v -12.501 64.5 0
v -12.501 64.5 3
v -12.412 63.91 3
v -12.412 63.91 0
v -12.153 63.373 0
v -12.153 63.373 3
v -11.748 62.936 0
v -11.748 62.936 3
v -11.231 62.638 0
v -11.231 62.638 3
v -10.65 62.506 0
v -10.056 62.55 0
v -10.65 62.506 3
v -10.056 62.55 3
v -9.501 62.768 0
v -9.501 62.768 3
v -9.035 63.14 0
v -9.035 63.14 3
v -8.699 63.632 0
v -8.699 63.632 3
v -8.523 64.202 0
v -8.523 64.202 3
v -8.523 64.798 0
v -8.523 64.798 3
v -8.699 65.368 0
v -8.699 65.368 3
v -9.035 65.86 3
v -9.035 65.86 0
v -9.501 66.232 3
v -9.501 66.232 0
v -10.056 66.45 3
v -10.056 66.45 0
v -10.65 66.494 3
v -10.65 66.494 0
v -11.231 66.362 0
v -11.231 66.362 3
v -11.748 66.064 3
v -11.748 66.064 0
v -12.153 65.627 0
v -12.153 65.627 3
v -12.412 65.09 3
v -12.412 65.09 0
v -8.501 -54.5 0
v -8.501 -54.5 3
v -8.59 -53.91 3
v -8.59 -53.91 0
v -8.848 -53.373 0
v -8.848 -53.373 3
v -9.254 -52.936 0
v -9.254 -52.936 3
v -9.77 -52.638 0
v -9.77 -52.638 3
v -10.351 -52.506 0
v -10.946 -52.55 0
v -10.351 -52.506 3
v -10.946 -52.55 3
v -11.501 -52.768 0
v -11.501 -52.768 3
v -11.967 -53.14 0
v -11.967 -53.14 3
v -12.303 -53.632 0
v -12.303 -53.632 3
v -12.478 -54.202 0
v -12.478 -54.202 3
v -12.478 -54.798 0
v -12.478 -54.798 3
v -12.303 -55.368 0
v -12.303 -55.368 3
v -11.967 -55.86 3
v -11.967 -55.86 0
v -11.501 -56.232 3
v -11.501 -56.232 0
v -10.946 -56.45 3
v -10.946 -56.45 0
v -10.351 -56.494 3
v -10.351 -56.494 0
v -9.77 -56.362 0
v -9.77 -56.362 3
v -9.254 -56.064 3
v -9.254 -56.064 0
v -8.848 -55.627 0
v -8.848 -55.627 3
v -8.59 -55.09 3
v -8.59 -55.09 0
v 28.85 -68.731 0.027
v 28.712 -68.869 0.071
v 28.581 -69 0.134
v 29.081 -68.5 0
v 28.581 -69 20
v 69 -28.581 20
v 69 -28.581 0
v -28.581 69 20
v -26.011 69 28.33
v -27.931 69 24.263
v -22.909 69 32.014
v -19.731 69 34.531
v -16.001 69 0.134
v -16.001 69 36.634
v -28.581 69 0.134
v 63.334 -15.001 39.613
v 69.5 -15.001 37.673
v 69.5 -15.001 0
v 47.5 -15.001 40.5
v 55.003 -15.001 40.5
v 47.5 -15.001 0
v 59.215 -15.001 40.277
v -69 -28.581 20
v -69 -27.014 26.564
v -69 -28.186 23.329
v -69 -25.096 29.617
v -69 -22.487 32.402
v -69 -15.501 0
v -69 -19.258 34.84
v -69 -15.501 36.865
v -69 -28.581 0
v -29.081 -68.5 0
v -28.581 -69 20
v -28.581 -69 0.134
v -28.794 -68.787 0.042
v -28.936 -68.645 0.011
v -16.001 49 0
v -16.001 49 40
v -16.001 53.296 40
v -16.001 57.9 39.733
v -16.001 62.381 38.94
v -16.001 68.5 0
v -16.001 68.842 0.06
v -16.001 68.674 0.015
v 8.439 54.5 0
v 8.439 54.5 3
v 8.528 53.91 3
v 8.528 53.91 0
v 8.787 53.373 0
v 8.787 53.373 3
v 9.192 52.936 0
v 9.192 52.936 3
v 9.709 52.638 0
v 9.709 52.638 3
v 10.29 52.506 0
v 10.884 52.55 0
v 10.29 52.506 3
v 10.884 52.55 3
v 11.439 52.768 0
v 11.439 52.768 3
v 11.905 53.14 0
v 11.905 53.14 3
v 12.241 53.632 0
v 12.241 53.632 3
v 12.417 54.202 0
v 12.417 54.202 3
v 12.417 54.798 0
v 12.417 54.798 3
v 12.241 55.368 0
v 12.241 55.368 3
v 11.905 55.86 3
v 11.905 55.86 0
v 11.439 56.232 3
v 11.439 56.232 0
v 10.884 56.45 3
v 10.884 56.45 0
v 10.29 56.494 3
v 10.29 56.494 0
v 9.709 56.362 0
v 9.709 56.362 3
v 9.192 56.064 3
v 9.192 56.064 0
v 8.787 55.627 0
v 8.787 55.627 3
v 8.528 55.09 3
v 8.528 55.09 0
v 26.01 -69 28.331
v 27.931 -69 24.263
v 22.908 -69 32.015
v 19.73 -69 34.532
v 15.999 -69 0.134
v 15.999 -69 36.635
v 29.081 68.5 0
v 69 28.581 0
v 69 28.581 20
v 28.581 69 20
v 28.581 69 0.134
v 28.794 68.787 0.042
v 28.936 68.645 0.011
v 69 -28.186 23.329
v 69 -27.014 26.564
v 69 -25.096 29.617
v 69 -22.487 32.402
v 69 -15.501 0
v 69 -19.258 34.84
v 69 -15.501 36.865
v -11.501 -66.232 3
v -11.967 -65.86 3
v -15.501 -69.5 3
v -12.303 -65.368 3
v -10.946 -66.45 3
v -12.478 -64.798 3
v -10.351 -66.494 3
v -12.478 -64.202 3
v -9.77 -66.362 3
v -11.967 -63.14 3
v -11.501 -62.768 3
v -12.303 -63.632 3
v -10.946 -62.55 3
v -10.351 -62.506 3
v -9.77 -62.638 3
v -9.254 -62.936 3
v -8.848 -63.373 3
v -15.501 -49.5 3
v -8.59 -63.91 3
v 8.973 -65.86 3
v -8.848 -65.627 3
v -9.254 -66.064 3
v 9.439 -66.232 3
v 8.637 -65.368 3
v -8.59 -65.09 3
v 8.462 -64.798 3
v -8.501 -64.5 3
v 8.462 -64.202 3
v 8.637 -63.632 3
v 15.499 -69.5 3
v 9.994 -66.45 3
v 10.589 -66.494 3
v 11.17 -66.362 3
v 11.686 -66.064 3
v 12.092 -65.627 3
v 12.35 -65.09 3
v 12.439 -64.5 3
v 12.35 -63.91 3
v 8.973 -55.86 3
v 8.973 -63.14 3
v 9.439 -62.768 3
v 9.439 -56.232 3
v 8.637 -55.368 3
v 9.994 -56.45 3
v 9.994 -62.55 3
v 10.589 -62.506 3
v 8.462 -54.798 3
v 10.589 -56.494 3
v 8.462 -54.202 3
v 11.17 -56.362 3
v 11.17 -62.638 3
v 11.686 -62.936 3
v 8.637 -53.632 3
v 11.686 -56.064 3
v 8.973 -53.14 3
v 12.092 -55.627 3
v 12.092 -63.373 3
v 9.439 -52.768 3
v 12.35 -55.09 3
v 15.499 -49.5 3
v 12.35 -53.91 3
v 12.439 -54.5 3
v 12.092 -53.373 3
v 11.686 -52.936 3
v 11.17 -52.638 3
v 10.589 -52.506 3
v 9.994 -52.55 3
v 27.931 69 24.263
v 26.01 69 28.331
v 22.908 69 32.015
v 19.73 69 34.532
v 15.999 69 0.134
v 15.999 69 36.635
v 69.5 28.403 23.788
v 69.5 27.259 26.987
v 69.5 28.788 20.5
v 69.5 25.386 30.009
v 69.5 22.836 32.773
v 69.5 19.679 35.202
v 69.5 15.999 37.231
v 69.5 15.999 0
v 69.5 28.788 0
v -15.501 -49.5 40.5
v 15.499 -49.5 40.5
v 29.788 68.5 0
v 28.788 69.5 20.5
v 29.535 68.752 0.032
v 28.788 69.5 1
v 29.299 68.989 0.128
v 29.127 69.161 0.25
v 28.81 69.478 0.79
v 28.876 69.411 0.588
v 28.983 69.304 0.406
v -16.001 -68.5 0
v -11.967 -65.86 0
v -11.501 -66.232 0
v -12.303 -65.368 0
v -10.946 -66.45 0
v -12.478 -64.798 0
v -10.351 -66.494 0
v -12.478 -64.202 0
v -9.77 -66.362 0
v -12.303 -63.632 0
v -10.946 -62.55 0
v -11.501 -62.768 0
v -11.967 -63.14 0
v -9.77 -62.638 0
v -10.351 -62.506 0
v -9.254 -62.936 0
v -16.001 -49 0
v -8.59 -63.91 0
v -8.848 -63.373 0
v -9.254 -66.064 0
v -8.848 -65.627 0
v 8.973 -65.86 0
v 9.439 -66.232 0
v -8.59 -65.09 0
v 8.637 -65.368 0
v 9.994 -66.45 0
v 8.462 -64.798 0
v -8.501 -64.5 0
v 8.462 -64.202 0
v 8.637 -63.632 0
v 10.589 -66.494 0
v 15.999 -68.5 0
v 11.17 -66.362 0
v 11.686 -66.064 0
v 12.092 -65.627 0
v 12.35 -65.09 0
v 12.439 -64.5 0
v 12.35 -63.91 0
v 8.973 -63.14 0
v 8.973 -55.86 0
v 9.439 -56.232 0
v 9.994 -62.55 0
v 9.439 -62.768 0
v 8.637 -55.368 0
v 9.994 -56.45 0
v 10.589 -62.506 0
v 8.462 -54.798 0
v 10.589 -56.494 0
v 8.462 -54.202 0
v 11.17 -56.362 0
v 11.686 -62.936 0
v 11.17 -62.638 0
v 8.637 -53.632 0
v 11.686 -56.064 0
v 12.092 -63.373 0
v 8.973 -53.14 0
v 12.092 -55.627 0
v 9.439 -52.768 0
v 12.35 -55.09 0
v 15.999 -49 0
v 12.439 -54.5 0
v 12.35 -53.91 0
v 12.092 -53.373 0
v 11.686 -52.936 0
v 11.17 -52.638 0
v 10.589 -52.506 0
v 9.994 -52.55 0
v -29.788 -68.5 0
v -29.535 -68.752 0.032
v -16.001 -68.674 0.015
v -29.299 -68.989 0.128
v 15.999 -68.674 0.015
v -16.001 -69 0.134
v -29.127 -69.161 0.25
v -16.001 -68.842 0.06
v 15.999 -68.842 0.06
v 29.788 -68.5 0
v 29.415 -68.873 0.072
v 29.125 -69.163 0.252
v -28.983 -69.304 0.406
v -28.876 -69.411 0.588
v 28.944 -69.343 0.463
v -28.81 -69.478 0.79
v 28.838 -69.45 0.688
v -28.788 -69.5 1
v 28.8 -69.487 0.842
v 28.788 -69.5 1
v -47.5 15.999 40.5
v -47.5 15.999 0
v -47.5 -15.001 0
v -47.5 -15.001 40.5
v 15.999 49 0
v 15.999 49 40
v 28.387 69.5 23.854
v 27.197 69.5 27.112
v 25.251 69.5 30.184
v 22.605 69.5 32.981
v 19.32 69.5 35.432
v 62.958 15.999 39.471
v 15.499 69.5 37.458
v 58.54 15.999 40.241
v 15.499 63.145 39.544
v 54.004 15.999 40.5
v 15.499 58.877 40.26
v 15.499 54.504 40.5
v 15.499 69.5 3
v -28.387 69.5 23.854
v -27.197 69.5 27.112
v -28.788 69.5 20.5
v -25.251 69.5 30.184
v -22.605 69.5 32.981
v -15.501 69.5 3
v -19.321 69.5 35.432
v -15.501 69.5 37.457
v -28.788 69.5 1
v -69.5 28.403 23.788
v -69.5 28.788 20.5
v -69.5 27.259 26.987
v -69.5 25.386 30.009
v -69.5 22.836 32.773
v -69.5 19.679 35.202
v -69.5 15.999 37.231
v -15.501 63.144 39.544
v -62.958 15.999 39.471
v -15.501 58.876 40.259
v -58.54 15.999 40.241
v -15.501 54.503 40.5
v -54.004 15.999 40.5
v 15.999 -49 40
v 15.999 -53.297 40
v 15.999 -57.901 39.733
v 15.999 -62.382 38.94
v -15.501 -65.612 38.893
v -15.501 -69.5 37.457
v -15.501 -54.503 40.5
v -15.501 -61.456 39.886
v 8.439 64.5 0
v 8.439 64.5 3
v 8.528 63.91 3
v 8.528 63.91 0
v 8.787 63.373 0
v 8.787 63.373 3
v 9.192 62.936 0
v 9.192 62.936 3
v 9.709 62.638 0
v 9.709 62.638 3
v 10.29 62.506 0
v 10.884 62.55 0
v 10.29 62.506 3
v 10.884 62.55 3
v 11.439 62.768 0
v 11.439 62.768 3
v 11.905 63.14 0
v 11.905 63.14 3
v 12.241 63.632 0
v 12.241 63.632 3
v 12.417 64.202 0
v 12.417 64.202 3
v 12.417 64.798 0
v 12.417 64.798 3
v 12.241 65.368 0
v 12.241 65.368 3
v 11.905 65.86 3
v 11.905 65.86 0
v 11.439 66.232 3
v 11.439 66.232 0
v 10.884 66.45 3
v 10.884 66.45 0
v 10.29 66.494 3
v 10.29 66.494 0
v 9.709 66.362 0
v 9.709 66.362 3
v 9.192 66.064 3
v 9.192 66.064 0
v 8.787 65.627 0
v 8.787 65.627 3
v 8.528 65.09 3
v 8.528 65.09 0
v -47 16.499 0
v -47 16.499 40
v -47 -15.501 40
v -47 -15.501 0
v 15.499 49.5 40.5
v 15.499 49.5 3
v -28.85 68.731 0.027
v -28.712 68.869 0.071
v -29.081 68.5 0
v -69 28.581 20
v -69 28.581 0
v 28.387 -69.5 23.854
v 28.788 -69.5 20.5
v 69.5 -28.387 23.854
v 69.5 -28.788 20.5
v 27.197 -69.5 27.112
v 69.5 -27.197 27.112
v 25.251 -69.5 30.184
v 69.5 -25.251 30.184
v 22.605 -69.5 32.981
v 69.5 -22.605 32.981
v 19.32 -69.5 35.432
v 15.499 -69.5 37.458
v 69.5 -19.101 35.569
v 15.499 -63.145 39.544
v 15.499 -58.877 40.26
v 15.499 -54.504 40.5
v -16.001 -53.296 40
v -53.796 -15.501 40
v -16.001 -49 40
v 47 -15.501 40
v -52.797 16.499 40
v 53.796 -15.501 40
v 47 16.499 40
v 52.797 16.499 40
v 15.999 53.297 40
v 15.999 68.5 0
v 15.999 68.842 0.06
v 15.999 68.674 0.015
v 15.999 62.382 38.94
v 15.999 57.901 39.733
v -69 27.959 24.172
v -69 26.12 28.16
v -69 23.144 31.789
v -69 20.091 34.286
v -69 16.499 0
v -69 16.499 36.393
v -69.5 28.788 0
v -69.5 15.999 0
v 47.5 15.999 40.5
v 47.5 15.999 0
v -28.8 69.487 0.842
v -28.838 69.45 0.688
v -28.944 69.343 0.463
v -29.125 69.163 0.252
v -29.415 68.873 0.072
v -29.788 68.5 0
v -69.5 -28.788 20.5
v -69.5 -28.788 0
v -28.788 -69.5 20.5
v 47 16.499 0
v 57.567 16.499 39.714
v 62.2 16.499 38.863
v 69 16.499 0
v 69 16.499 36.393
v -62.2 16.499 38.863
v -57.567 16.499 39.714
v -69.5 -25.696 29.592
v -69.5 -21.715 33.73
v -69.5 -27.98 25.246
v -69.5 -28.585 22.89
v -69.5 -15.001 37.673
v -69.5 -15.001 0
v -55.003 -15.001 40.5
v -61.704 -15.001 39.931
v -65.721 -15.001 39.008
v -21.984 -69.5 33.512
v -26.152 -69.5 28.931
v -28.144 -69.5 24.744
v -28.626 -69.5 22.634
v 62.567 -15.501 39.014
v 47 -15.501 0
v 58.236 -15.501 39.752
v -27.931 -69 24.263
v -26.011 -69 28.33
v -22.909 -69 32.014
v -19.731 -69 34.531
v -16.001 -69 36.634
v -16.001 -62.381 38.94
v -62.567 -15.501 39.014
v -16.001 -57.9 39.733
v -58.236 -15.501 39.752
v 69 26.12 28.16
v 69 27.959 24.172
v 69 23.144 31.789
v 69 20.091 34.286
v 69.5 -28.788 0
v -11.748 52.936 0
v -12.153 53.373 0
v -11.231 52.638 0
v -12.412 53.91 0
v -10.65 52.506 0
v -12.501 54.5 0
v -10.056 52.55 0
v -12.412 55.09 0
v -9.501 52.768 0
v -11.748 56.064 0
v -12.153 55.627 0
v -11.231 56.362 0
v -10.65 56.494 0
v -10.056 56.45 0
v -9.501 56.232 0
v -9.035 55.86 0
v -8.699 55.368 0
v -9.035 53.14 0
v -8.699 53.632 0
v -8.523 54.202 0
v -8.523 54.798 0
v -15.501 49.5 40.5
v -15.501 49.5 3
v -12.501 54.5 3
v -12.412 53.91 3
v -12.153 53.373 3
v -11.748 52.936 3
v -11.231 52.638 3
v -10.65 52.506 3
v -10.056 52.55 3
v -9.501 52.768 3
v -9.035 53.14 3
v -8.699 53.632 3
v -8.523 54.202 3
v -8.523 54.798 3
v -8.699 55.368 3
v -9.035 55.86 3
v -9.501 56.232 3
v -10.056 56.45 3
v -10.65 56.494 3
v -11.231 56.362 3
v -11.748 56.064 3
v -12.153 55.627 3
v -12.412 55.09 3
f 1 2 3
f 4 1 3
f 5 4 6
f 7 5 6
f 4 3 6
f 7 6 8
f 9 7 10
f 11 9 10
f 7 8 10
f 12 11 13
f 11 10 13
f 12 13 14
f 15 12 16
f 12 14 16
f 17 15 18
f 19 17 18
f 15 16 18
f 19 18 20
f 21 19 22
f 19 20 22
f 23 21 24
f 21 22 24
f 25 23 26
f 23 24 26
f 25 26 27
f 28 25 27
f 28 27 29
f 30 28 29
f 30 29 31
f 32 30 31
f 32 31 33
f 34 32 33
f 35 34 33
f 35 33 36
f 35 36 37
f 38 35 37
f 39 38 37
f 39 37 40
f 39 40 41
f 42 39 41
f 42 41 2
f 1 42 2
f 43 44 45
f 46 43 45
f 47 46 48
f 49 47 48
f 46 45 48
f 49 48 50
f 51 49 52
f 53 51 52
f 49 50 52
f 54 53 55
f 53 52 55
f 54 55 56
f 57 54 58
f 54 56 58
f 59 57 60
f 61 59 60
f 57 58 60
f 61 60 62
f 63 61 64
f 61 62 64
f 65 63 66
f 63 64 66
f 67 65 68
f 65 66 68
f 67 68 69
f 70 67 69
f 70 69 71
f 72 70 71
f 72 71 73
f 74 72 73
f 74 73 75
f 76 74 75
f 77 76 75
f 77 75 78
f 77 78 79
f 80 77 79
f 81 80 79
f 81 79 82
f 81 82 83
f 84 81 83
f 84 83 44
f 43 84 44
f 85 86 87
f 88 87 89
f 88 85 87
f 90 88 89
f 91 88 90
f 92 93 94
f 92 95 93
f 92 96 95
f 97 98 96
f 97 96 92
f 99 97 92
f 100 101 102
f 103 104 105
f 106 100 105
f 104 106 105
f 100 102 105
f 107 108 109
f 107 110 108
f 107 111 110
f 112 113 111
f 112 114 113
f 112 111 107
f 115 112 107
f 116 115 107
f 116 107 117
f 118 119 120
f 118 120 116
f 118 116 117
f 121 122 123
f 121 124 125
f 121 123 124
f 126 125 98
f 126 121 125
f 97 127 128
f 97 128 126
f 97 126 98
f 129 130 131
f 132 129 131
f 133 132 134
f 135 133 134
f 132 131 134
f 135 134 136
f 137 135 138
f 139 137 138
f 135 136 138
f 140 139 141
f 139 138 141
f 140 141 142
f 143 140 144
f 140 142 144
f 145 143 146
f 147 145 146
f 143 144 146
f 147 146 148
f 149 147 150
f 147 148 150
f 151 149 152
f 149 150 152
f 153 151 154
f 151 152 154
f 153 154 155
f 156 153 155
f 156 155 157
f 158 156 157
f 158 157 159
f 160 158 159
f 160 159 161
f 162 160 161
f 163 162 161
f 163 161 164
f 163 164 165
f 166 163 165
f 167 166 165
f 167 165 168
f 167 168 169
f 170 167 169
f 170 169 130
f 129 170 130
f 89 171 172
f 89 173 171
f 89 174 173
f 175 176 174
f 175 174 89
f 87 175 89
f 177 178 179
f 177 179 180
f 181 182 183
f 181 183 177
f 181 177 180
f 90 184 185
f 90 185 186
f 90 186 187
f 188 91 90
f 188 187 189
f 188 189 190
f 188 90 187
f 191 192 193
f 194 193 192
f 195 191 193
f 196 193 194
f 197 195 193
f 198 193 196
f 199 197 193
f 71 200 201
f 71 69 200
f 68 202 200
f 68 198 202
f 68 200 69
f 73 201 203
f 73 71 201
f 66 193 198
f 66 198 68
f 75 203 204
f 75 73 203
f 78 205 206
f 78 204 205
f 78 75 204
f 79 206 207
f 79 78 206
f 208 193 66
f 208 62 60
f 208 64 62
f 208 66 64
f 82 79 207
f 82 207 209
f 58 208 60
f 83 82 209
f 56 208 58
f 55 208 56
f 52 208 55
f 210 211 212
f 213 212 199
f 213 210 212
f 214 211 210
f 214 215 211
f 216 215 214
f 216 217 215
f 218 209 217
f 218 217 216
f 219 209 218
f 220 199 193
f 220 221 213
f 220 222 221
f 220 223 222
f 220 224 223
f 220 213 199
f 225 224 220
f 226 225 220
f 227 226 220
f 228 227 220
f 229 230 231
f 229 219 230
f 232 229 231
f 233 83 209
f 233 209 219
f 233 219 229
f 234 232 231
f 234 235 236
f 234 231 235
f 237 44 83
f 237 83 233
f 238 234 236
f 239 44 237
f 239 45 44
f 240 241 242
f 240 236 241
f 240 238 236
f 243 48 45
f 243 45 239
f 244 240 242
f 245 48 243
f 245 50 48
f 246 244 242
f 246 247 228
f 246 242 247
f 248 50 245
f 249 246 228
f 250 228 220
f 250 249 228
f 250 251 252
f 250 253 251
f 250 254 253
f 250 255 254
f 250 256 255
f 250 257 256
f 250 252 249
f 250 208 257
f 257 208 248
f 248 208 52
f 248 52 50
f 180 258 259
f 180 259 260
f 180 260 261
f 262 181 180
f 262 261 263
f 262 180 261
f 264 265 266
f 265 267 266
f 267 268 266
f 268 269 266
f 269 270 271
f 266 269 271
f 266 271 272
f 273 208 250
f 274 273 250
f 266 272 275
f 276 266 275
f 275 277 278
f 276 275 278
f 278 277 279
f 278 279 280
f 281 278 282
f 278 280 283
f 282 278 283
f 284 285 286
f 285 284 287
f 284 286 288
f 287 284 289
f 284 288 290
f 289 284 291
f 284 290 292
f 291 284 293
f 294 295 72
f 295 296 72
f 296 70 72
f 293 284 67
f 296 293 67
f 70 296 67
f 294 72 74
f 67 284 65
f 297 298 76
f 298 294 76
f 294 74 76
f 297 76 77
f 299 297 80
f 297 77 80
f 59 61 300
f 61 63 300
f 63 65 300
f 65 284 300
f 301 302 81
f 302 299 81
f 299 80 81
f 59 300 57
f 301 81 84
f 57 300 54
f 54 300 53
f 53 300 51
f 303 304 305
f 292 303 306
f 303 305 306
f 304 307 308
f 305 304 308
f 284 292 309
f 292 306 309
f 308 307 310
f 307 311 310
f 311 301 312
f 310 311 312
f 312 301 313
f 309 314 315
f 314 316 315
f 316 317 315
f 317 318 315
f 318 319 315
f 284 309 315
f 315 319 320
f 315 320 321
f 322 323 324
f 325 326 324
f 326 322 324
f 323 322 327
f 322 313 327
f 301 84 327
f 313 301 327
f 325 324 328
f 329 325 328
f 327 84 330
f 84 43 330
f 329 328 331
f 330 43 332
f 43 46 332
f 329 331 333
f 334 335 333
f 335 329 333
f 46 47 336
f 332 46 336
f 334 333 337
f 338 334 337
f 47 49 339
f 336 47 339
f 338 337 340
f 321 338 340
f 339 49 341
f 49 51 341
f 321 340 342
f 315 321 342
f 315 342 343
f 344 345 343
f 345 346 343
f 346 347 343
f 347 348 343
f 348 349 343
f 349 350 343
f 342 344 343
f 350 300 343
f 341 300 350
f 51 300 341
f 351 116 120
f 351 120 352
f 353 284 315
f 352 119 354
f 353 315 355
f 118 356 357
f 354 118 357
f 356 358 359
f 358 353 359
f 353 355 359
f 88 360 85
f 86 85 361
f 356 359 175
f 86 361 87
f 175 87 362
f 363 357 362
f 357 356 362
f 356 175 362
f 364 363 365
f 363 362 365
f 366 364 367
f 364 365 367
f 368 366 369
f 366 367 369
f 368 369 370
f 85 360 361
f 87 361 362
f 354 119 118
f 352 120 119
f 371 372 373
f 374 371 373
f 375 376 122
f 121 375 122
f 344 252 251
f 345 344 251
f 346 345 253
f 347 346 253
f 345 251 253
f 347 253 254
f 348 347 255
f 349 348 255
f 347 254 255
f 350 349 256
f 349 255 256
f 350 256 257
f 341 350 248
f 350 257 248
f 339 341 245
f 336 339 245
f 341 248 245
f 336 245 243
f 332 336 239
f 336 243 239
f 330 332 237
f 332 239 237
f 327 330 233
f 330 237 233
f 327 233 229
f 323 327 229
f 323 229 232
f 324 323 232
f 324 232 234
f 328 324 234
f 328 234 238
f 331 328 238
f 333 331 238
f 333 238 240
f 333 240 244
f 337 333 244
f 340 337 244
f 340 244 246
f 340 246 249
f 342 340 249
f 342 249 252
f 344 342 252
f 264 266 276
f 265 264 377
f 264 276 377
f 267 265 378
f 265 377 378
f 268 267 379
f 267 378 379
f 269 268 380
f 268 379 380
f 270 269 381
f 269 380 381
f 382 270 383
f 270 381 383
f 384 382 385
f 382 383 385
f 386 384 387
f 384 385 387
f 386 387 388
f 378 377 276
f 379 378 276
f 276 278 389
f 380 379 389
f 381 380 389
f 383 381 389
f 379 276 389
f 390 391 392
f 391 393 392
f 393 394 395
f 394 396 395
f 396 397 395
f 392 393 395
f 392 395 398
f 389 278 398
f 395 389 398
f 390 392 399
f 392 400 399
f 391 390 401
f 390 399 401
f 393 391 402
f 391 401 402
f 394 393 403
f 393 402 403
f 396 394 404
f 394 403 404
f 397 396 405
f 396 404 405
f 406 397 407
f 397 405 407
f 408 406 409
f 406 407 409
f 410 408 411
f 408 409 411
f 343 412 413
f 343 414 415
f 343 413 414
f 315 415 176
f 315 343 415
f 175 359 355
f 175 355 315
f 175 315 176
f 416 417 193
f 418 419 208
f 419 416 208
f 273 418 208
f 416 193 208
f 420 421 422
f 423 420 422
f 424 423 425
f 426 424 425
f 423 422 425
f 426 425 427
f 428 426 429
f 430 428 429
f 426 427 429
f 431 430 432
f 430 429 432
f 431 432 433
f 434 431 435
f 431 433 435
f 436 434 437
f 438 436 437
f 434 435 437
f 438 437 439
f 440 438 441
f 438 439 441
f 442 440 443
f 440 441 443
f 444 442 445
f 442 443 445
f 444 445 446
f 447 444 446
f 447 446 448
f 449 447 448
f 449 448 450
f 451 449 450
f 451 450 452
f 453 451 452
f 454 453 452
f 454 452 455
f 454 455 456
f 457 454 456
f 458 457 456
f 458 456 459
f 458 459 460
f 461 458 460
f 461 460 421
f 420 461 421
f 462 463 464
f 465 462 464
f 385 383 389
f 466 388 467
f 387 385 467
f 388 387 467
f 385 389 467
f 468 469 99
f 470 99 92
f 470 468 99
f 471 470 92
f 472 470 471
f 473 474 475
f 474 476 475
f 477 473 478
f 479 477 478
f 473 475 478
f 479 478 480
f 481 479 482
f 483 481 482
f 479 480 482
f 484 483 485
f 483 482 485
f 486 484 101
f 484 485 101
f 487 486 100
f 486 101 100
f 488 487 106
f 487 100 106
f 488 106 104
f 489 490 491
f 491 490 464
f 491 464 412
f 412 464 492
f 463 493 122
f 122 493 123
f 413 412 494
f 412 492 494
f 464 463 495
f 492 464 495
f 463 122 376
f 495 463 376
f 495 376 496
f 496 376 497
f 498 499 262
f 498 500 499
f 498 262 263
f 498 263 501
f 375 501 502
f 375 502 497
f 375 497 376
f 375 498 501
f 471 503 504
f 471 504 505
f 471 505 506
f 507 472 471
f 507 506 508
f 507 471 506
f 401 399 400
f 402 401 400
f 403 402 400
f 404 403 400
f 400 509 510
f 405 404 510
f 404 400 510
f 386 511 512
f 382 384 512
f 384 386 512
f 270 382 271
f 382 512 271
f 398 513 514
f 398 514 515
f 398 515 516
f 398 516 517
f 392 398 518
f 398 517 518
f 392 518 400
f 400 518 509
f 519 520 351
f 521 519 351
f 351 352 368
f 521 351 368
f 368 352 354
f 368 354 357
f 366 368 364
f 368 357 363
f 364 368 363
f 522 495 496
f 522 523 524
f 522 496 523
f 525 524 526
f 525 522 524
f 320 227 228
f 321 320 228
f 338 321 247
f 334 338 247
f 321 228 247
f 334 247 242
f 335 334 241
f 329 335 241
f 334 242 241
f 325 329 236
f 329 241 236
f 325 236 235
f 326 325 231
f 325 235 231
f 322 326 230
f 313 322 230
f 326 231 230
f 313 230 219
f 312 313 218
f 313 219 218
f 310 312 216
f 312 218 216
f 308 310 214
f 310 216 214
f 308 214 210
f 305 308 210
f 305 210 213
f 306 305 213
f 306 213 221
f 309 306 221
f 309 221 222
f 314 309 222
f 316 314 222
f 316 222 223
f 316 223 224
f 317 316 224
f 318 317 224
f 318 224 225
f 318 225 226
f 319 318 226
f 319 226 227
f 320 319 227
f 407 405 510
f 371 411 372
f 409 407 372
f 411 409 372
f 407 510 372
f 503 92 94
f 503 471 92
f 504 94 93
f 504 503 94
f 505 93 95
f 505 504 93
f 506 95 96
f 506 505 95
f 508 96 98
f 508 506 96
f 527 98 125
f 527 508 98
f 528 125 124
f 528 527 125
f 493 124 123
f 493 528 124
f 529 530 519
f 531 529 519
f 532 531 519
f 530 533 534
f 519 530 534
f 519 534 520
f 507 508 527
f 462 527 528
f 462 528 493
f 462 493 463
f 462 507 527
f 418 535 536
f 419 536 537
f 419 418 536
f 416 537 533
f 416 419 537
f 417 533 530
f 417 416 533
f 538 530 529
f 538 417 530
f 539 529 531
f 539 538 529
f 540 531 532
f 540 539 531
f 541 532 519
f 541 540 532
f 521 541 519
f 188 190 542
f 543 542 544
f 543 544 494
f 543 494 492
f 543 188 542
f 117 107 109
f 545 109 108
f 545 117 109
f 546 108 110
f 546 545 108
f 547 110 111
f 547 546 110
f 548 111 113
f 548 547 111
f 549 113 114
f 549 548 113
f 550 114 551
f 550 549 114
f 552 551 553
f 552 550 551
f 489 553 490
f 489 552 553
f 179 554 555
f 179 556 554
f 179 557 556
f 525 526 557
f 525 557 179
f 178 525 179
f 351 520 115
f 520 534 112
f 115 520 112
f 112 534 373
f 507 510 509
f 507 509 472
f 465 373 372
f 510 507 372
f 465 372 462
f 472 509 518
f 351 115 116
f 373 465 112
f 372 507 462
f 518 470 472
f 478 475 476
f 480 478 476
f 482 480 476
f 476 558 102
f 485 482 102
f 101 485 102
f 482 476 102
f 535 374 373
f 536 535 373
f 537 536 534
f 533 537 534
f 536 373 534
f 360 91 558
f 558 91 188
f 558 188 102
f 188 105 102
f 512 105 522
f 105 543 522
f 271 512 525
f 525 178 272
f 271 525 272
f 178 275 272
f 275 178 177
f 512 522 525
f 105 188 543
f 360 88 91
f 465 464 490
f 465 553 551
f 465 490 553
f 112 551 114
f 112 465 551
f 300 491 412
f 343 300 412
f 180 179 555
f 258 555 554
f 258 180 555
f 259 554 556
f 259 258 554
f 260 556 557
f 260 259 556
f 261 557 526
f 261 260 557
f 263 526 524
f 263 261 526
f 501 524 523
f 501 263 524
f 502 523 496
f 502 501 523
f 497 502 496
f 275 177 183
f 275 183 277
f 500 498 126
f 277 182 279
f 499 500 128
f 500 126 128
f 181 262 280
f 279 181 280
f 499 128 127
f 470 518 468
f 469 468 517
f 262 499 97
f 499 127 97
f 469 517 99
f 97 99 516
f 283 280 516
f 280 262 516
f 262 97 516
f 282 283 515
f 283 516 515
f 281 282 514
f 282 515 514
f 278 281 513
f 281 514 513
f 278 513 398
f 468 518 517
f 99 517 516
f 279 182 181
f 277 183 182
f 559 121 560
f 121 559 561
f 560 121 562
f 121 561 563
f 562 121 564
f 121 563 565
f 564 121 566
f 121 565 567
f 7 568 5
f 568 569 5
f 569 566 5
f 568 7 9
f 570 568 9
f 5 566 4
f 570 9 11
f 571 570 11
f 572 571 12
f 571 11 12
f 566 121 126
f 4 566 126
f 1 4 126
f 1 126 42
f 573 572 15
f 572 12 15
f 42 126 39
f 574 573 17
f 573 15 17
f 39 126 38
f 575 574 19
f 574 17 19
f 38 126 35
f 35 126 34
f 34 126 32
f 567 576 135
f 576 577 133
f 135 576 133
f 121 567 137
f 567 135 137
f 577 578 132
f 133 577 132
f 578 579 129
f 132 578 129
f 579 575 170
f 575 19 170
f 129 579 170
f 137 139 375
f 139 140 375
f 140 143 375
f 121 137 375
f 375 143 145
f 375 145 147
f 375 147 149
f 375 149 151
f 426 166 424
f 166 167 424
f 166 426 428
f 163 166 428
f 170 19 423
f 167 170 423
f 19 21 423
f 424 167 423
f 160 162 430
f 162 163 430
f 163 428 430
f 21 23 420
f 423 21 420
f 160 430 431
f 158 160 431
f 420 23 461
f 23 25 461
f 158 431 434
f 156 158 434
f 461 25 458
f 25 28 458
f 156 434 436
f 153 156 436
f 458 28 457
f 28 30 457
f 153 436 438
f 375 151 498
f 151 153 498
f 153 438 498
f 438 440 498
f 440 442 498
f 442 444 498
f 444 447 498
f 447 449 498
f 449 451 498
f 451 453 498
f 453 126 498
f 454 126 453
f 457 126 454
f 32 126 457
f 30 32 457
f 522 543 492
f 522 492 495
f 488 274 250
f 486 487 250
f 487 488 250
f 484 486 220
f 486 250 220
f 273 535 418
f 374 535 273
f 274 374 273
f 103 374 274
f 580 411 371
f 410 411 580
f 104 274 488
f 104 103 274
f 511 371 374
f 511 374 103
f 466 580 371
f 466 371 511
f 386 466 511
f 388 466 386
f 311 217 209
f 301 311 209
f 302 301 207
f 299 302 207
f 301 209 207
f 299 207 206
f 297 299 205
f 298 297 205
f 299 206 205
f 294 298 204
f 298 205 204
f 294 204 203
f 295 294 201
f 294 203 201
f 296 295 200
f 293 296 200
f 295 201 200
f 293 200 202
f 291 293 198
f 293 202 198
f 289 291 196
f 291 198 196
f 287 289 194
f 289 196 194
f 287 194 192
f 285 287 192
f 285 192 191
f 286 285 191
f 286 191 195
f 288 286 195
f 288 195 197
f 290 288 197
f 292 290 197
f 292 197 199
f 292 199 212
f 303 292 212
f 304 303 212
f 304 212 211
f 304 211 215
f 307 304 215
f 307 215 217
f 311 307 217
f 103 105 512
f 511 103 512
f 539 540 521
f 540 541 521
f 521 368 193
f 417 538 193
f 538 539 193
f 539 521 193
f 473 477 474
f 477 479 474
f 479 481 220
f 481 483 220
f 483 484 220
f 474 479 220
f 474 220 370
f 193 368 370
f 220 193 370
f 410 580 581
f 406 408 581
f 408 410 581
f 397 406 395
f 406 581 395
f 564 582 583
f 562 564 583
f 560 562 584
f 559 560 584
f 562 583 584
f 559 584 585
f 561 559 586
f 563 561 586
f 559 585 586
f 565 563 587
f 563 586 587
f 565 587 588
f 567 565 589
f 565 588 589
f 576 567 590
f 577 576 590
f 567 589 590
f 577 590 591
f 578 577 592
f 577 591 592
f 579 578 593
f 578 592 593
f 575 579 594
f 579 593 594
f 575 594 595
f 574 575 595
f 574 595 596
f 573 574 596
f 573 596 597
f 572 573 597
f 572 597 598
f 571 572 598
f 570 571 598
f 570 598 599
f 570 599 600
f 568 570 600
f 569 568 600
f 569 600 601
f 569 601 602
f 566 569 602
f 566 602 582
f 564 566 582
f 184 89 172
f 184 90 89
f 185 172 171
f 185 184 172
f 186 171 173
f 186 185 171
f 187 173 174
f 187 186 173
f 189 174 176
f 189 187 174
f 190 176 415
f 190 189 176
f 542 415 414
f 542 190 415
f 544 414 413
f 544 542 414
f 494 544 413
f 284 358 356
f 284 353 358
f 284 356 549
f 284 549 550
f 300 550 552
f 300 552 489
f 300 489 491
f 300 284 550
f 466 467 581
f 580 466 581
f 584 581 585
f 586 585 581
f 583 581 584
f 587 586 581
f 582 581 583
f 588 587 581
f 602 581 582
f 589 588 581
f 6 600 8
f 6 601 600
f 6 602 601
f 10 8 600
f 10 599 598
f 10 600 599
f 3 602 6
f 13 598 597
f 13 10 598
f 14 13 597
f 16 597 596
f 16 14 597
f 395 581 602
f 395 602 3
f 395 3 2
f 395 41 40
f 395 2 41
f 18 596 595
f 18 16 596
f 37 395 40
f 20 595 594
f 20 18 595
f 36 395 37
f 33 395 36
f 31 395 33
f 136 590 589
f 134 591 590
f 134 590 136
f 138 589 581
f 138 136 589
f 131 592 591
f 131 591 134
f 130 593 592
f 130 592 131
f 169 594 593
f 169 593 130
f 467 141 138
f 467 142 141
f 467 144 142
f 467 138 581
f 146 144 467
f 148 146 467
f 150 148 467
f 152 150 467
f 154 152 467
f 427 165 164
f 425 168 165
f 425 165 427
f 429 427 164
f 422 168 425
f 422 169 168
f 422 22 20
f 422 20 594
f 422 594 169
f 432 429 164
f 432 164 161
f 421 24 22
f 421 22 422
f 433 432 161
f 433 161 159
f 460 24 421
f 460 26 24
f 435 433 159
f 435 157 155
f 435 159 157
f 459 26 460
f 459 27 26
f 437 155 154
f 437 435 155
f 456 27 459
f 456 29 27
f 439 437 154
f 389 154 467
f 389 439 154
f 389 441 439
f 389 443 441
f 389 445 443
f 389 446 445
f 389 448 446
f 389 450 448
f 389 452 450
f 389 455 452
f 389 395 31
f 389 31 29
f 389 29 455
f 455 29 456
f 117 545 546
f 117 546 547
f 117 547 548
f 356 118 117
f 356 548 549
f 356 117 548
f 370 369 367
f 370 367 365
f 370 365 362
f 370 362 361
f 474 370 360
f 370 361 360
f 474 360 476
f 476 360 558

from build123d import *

# Parameters (mm, degrees)
RESSALTO_EXTRUS_O1_DEPTH = 40
CASCA1_T                 = 0.5
ESBO_O2_W                = 31
ESBO_O2_H                = 20
RESSALTO_EXTRUS_O2_DEPTH = 3
FILETE1_R                = 20
FILETE2_R                = 20
ESBO_O3_R                = 2
CORTE_EXTRUS_O1_DEPTH    = 106.198621664
FILETE3_R                = 1
FILETE4_R                = 1


with BuildPart() as part:
    # Esboço1 → Ressalto-extrusão1 (new body)
    with BuildSketch(Plane.XY):
        Polygon((-16.000735804, -69), (-16.000735804, -49), (15.999264196, -49), (15.999264196, -69), (28.580735804, -69), (69, -28.580735804), (69, -15.500735804), (47, -15.500735804), (47, 16.499264196), (69, 16.499264196), (69, 28.580735804), (28.580735804, 69), (15.999264196, 69), (15.999264196, 49), (-16.000735804, 49), (-16.000735804, 69), (-28.580735804, 69), (-69, 28.580735804), (-69, 16.499264196), (-47, 16.499264196), (-47, -15.500735804), (-69, -15.500735804), (-69, -28.580735804), (-28.580735804, -69), align=None)
    extrude(amount=RESSALTO_EXTRUS_O1_DEPTH)

    # Casca1
    casca1_openings = [part.faces().sort_by_distance(p)[0] for p in [
        (7.1958e-05, -0.05370825, 0),
    ]]
    offset(amount=CASCA1_T, openings=casca1_openings, kind=Kind.INTERSECTION)

    # Esboço2 → Ressalto-extrusão2 (add)
    with BuildSketch(Plane.XY):
        with Locations((-0.000735804, -59.5)):
            Rectangle(ESBO_O2_W, ESBO_O2_H)
        with Locations((-0.000735804, 59.5)):
            Rectangle(ESBO_O2_W, ESBO_O2_H)
    extrude(amount=RESSALTO_EXTRUS_O2_DEPTH)

    # Filete1
    filete1_edges = [part.edges().sort_by_distance(p)[0] for p in [
        (-49.143921292, 49.143921292, 40.5),
        (49.143921292, -49.143921292, 40.5),
        (-49.143921292, -49.143921292, 40.5),
        (49.143921292, 49.143921292, 40.5),
    ]]
    fillet(filete1_edges, radius=FILETE1_R)

    # Filete2
    filete2_edges = [part.edges().sort_by_distance(p)[0] for p in [
        (-48.790367902, 48.790367902, 40),
        (-48.790367902, -48.790367902, 40),
        (48.790367902, -48.790367902, 40),
        (48.790367902, 48.790367902, 40),
    ]]
    fillet(filete2_edges, radius=FILETE2_R)

    # Esboço3 → Corte-extrusão1 (cut, through all)
    with BuildSketch(Plane.XY.offset(3)):
        with Locations((-10.500735804, -54.5)):
            Circle(ESBO_O3_R)
        with Locations((-10.500735804, -64.5)):
            Circle(ESBO_O3_R)
        with Locations((10.439264196, -64.5)):
            Circle(ESBO_O3_R)
        with Locations((10.439264196, -54.5)):
            Circle(ESBO_O3_R)
        with Locations(Location((10.439264196, 54.5, 0), (0, 0, 180))):
            Circle(ESBO_O3_R)
        with Locations(Location((10.439264196, 64.5, 0), (0, 0, 180))):
            Circle(ESBO_O3_R)
        with Locations(Location((-10.500735804, 64.5, 0), (0, 0, 180))):
            Circle(ESBO_O3_R)
        with Locations(Location((-10.500735804, 54.5, 0), (0, 0, 180))):
            Circle(ESBO_O3_R)
    extrude(amount=-CORTE_EXTRUS_O1_DEPTH, mode=Mode.SUBTRACT)

    # Filete3
    # the kernel refuses this fillet: 1 mm, written as the material it takes off along each edge
    with BuildSketch(Plane(origin=(31.287842585, -69.5, 0), x_dir=(0, 1, 0), z_dir=(-1, 0, 0))) as filete3_piece_1:
        with BuildLine():
            CenterArc((FILETE3_R, -FILETE3_R), FILETE3_R, 90, 90)
            Line((0, -FILETE3_R), (0, 0))
            Line((0, 0), (FILETE3_R, 0))
        make_face()
    extrude(amount=62.57568517, mode=Mode.SUBTRACT)

    # Filete4
    # the kernel refuses this fillet: 1 mm, written as the material it takes off along each edge
    with BuildSketch(Plane(origin=(-31.287842585, 69.5, 0), x_dir=(0, -1, 0), z_dir=(1, 0, 0))) as filete4_piece_1:
        with BuildLine():
            CenterArc((FILETE4_R, -FILETE4_R), FILETE4_R, 90, 90)
            Line((0, -FILETE4_R), (0, 0))
            Line((0, 0), (FILETE4_R, 0))
        make_face()
    extrude(amount=62.57568517, mode=Mode.SUBTRACT)


solid = part.part
